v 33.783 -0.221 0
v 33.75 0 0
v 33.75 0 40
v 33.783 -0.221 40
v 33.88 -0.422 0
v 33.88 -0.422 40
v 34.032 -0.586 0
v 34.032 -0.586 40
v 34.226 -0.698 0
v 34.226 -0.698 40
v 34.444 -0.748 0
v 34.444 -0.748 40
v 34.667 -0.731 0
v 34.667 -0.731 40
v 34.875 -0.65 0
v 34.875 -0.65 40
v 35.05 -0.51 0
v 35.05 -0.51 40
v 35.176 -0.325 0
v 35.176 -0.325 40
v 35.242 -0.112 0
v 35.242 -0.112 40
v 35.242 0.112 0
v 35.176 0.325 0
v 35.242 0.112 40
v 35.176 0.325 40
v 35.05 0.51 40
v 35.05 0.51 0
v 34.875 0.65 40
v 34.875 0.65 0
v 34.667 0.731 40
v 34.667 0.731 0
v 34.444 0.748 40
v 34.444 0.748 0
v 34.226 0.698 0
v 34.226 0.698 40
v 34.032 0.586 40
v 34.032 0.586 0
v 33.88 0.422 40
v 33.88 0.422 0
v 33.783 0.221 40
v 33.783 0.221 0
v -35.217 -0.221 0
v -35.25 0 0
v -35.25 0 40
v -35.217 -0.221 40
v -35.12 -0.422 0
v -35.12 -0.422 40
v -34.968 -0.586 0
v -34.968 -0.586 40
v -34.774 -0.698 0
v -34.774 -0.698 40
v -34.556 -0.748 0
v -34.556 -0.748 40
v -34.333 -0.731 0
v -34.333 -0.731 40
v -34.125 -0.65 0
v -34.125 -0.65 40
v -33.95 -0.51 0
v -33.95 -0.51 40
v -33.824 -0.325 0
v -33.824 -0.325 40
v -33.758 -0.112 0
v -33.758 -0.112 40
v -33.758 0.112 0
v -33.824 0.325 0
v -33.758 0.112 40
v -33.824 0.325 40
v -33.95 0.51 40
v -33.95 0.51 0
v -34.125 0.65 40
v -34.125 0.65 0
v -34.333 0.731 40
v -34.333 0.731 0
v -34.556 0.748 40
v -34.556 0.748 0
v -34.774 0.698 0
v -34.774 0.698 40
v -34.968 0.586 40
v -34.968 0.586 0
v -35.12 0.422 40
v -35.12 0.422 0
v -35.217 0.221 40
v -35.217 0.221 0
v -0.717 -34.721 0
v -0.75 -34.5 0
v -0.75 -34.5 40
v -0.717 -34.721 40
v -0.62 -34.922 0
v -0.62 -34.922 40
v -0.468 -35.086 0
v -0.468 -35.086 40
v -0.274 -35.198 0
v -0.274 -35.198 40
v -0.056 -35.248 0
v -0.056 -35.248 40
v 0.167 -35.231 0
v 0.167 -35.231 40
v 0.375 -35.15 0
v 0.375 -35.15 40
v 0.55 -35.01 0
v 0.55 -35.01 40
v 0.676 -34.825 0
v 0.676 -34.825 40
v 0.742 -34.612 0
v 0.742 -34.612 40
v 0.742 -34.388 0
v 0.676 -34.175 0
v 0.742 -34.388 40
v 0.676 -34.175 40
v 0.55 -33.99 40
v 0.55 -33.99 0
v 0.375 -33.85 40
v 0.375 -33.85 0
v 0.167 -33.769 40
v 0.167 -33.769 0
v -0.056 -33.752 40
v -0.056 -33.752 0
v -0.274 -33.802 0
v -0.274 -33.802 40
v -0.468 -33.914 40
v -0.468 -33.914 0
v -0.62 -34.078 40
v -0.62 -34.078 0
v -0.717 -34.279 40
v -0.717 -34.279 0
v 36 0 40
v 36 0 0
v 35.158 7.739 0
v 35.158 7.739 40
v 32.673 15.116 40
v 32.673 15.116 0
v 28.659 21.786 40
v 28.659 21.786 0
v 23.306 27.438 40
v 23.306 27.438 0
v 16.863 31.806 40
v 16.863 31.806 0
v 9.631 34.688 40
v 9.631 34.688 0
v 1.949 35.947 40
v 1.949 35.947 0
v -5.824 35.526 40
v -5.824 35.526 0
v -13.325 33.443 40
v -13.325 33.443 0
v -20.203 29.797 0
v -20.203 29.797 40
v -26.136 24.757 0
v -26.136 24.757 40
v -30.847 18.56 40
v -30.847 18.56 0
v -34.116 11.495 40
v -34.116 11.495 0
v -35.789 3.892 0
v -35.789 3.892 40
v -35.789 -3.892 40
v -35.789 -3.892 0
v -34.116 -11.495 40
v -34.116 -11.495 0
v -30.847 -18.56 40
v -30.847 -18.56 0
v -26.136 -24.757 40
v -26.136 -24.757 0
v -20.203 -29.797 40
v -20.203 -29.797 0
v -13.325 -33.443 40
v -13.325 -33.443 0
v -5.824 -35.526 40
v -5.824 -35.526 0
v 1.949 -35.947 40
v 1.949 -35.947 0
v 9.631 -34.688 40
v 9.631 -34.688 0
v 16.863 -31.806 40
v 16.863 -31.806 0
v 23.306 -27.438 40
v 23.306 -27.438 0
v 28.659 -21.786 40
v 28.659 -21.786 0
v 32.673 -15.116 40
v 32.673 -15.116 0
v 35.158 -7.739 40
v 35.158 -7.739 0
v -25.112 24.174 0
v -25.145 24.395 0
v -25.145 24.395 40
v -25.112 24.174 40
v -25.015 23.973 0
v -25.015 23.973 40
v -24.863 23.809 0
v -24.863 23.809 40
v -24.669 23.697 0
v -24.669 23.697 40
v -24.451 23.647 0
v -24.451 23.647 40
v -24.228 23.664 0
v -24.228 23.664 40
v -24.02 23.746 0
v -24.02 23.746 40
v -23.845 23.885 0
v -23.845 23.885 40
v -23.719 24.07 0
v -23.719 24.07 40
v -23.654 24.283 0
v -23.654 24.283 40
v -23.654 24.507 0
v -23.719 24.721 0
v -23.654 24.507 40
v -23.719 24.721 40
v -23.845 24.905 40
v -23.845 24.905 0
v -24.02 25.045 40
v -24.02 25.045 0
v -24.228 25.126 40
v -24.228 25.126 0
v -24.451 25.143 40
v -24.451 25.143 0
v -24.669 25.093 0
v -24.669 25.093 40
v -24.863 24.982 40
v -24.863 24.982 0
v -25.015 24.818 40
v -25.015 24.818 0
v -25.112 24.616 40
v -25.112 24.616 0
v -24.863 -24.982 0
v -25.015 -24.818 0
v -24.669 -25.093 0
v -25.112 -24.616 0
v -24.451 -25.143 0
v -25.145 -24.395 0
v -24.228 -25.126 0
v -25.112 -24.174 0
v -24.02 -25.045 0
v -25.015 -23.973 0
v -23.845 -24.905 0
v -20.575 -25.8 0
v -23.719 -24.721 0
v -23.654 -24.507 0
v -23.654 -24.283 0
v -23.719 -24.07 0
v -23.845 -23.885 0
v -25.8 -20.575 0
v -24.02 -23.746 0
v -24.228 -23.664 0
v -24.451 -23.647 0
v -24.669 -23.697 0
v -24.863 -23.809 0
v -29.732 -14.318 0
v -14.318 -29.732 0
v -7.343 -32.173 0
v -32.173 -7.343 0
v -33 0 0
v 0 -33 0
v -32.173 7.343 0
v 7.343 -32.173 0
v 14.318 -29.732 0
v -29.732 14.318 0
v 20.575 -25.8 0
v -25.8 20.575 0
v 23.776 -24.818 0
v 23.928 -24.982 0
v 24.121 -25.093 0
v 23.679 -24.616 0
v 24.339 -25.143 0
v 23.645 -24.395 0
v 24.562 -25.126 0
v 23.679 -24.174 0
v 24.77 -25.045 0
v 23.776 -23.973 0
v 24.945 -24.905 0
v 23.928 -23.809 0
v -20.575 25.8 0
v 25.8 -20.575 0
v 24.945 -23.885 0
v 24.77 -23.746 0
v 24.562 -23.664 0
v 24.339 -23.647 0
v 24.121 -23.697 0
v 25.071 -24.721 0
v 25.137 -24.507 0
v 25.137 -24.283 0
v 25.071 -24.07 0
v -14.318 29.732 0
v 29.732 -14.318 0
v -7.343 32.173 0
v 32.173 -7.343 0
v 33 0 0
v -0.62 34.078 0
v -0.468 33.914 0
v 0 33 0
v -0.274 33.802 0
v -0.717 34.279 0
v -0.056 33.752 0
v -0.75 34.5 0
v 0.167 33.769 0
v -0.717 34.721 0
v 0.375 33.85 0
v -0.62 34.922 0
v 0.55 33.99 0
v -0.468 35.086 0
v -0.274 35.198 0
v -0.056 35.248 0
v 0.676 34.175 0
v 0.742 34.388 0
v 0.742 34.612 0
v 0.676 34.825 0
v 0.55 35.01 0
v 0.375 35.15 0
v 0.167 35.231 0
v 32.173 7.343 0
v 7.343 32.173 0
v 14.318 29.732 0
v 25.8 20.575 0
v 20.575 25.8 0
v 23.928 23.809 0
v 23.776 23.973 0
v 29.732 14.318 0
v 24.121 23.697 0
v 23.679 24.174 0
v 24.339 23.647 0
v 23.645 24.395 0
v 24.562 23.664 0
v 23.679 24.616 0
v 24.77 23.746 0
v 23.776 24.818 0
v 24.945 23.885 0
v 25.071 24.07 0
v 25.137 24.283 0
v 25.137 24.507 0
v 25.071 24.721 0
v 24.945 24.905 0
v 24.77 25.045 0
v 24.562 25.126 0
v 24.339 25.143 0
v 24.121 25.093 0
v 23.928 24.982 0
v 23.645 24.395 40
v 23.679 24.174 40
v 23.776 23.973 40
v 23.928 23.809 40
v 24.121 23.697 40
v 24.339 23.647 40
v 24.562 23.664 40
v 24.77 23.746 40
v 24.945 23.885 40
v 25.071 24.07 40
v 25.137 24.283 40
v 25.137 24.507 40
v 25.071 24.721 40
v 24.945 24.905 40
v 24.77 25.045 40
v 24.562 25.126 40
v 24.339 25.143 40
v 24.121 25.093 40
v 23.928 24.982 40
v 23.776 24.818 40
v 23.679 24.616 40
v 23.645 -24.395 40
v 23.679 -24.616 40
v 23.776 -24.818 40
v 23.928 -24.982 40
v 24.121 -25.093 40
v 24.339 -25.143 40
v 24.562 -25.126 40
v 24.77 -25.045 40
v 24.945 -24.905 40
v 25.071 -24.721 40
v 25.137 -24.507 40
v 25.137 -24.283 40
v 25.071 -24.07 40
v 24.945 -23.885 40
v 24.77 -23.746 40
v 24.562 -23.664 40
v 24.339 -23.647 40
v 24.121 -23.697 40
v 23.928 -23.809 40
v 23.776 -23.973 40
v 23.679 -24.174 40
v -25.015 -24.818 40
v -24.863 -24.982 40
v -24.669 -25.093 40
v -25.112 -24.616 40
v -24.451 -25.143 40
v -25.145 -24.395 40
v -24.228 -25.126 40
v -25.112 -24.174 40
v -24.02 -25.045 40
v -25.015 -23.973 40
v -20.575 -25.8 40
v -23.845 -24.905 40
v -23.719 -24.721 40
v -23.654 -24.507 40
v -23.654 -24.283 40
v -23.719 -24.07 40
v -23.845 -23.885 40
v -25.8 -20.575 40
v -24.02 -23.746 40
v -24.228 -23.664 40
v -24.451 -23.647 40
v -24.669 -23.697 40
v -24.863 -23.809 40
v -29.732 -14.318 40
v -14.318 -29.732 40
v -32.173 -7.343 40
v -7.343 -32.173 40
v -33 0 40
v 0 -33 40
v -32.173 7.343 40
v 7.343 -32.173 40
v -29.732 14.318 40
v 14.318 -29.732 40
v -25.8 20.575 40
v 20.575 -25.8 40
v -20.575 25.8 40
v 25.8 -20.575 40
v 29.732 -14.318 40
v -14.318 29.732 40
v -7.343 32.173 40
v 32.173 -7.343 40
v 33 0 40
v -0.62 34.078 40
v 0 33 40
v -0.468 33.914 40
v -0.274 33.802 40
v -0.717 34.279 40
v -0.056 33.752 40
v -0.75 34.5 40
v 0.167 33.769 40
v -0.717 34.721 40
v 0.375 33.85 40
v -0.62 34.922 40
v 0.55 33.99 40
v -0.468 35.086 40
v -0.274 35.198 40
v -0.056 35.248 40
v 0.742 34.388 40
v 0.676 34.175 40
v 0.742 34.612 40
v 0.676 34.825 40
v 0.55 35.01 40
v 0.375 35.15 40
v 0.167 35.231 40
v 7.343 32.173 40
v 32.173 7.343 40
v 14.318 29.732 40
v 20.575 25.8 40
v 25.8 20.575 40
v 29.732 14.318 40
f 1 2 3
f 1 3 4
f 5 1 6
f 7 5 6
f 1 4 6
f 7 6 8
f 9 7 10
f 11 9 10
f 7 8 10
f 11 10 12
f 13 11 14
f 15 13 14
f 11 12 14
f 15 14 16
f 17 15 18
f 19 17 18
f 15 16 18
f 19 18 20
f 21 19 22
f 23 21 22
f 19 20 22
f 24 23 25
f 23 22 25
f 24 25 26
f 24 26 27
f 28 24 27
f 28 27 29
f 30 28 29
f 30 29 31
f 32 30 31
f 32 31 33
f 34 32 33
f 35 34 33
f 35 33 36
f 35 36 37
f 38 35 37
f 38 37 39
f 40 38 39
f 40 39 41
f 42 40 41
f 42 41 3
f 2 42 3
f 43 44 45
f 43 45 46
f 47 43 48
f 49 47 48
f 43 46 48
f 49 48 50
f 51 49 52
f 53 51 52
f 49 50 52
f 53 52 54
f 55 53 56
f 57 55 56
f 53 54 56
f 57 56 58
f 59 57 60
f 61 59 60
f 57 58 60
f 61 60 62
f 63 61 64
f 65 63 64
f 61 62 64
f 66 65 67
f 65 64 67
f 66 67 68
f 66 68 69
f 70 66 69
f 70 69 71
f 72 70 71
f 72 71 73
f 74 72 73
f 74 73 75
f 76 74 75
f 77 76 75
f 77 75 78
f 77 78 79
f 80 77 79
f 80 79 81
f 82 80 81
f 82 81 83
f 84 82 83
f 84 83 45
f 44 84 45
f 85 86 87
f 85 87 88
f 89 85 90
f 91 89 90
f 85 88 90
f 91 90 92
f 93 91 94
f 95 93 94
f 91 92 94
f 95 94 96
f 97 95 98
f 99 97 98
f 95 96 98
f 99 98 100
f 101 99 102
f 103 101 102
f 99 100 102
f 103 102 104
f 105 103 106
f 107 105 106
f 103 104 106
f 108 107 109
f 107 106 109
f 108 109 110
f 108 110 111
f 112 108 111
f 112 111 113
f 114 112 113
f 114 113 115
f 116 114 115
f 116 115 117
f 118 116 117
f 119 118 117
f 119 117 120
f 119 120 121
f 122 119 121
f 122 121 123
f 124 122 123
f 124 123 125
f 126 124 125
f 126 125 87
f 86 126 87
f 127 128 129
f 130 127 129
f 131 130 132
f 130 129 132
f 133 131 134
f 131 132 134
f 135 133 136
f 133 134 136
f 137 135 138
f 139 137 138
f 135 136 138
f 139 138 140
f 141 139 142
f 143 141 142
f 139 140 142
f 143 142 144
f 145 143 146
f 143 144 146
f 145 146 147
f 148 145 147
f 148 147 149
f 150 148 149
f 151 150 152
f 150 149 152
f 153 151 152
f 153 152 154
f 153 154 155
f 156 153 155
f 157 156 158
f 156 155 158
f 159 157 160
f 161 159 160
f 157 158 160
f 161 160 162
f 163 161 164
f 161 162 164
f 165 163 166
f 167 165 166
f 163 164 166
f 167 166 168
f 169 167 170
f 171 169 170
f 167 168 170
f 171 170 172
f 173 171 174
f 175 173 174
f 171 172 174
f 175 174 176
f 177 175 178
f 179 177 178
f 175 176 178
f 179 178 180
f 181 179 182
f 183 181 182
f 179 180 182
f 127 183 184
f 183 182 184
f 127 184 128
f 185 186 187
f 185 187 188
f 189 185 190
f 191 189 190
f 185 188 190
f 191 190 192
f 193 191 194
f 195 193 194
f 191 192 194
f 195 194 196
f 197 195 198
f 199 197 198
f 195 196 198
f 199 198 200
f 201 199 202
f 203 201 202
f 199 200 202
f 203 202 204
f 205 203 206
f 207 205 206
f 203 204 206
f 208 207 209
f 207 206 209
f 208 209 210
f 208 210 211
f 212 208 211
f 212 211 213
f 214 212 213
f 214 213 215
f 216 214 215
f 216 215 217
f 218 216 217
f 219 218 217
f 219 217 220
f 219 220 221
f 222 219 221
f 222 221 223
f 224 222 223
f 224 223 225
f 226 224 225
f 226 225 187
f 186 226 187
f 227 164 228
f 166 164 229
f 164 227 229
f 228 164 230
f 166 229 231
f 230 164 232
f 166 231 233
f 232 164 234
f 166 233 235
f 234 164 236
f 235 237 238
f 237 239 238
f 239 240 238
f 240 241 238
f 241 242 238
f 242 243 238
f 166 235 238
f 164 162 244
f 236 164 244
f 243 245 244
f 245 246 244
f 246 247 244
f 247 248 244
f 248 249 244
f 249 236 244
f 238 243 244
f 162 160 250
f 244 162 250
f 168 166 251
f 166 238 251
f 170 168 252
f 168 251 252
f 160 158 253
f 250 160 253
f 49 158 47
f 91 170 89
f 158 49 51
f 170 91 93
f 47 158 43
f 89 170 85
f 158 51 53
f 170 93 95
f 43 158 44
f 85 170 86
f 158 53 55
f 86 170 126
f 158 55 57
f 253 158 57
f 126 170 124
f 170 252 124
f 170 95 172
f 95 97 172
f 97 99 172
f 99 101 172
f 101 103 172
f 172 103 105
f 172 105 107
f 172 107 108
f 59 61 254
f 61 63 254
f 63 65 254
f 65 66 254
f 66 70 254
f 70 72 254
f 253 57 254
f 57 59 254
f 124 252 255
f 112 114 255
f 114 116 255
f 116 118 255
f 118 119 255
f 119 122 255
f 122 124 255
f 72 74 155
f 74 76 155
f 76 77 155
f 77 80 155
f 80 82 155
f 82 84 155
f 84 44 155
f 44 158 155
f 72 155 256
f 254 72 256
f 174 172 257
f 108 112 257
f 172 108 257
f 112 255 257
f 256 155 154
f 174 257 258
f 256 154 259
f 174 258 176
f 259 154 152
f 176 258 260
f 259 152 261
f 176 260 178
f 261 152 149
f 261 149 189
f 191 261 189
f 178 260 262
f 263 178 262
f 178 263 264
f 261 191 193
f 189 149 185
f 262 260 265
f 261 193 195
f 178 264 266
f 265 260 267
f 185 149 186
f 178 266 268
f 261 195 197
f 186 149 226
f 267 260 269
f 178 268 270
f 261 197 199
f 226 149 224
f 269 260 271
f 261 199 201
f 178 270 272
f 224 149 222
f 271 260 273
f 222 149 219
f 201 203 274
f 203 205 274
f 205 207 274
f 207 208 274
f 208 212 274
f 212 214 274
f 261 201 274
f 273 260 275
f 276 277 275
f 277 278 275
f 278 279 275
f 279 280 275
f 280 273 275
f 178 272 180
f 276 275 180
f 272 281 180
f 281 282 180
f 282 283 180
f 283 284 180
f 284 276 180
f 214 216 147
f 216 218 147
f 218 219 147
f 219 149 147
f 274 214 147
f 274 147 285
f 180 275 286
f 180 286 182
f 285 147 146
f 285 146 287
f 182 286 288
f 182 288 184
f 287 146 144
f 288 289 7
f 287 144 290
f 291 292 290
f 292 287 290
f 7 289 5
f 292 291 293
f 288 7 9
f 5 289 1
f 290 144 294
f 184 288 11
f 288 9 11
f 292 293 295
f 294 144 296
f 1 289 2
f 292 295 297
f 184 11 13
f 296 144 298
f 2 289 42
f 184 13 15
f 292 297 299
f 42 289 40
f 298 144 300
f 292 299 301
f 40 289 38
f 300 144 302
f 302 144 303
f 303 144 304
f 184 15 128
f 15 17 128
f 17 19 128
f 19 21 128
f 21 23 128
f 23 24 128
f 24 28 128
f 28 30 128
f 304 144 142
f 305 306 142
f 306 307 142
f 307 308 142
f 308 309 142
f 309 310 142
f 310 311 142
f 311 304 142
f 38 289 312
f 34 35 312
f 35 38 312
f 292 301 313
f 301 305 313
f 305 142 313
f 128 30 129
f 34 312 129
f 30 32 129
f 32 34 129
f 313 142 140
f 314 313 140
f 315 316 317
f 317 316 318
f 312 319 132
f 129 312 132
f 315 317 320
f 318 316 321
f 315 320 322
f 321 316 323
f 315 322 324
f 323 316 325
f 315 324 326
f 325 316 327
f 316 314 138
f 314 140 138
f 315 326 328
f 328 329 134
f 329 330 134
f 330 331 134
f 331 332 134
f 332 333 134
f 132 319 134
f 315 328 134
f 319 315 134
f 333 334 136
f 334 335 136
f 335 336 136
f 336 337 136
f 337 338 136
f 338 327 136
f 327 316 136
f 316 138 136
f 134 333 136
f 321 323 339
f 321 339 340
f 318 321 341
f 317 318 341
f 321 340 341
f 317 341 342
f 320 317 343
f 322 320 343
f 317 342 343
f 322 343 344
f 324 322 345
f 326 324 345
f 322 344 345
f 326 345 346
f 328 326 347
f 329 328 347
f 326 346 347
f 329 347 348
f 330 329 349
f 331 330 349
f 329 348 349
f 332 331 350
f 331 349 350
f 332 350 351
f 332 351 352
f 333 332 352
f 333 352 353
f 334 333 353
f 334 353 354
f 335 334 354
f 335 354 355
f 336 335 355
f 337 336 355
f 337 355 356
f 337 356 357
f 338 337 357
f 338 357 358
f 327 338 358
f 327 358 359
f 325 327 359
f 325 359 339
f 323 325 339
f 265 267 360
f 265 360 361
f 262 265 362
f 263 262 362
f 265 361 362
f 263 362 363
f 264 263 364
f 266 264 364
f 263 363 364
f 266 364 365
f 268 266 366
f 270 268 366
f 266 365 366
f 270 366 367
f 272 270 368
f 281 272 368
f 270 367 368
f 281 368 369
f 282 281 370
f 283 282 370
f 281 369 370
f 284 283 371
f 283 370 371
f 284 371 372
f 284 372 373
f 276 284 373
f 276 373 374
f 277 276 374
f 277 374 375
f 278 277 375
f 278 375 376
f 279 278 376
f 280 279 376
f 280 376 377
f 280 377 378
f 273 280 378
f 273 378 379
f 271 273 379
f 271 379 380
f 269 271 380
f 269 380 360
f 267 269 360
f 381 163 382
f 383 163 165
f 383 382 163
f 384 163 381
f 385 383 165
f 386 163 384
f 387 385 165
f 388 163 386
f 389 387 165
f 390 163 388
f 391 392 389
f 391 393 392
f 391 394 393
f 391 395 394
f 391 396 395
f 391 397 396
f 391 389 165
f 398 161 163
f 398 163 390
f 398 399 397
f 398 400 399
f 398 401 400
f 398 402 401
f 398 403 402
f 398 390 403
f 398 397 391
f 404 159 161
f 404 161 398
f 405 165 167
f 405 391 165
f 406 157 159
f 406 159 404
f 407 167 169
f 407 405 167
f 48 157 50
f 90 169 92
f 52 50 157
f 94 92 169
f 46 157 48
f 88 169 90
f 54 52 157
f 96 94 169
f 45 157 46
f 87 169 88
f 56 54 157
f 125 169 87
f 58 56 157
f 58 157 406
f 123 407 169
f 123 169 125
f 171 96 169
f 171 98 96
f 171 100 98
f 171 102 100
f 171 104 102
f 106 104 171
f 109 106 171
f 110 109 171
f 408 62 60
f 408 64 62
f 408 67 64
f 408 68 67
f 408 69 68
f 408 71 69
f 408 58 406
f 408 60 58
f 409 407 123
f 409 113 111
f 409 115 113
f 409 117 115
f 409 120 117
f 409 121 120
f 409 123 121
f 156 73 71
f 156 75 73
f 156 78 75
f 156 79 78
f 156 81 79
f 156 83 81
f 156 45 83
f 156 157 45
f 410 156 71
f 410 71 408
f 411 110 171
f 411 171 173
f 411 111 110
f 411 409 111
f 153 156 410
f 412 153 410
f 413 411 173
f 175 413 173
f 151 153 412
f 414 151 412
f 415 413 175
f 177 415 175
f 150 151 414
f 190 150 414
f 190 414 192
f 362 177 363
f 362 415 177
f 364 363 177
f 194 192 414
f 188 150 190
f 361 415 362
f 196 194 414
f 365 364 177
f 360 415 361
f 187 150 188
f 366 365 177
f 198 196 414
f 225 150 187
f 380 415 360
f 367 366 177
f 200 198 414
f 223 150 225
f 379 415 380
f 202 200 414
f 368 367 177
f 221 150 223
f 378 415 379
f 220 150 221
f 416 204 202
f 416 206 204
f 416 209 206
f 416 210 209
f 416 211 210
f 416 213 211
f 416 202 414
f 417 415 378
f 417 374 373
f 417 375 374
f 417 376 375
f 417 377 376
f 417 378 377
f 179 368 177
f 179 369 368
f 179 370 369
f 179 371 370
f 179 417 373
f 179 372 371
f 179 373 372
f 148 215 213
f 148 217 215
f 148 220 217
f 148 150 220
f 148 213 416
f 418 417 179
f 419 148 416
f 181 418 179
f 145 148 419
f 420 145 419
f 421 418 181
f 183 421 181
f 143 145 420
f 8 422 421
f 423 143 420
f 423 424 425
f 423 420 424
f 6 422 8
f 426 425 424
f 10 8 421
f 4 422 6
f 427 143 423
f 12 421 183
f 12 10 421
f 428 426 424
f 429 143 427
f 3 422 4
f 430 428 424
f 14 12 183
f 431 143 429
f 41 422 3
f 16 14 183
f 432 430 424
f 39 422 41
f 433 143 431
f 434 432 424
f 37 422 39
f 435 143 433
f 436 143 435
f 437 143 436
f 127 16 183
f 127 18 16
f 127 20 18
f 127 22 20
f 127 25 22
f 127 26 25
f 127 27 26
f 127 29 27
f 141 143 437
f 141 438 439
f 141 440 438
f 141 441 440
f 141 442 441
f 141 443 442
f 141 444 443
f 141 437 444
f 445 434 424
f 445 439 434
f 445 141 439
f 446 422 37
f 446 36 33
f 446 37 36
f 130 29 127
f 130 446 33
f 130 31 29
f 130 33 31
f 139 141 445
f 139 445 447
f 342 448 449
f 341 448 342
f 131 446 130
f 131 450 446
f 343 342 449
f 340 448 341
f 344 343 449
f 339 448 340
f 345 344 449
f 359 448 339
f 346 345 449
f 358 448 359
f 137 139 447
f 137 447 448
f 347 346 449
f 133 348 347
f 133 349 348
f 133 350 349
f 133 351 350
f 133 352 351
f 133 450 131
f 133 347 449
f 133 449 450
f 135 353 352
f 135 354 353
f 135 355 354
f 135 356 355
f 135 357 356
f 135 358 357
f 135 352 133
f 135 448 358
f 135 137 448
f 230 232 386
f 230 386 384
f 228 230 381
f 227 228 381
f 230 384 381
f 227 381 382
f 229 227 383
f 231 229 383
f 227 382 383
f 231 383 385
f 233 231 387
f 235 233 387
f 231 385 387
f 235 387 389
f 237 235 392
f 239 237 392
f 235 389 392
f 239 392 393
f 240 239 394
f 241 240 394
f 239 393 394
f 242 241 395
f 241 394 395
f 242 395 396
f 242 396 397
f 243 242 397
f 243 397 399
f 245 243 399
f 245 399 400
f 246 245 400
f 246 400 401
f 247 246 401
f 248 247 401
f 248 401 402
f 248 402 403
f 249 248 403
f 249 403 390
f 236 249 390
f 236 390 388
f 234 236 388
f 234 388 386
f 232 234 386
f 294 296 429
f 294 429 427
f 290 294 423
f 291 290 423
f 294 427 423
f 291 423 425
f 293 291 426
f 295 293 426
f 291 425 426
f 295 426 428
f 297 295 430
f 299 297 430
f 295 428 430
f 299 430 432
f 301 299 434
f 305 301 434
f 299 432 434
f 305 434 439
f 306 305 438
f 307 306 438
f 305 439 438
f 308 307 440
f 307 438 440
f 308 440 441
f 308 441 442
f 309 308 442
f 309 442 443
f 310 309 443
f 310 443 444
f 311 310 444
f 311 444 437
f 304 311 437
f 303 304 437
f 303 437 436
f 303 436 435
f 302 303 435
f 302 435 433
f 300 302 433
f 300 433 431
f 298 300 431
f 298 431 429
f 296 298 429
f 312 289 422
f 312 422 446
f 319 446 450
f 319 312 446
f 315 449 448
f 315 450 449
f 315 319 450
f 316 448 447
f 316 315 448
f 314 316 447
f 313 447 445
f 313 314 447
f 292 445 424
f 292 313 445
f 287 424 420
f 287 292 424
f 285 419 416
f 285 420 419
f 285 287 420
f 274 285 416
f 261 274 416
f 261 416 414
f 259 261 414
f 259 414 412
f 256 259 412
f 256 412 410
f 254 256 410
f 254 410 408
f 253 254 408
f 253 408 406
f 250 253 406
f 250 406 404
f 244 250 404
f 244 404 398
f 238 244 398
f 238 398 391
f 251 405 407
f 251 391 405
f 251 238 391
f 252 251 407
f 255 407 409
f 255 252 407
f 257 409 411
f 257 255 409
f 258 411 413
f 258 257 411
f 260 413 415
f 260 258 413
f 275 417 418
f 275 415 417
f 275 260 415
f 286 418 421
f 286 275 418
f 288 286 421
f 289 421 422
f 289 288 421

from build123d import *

# Parameters (mm, degrees)
F0_R     = 36
F1_DEPTH = 40
F2_R     = 33
F3_DEPTH = 40.001
F5_D     = 1.5


with BuildPart() as f1:
    # F0 (on Top) → F1 (new body)
    with BuildSketch(Plane.XY):
        Circle(F0_R)
    extrude(amount=F1_DEPTH)

    # F2 (on Top) → F3 (cut, through all)
    with BuildSketch(Plane.XY):
        Circle(F2_R)
    extrude(amount=F3_DEPTH, mode=Mode.SUBTRACT)

    # F5 (through all)
    with Locations(Plane(origin=(0, 0, 0), x_dir=(1, 0, 0), z_dir=(0, 0, -1))):
        with Locations((0, 34.5), (-24.3951839509, 24.3951839509), (-34.5, 0), (24.3951839509, 24.3951839509), (-24.3951839509, -24.3951839509), (0, -34.5), (24.3951839509, -24.3951839509), (34.5, 0)):
            Hole(F5_D / 2)


solid = f1.part
